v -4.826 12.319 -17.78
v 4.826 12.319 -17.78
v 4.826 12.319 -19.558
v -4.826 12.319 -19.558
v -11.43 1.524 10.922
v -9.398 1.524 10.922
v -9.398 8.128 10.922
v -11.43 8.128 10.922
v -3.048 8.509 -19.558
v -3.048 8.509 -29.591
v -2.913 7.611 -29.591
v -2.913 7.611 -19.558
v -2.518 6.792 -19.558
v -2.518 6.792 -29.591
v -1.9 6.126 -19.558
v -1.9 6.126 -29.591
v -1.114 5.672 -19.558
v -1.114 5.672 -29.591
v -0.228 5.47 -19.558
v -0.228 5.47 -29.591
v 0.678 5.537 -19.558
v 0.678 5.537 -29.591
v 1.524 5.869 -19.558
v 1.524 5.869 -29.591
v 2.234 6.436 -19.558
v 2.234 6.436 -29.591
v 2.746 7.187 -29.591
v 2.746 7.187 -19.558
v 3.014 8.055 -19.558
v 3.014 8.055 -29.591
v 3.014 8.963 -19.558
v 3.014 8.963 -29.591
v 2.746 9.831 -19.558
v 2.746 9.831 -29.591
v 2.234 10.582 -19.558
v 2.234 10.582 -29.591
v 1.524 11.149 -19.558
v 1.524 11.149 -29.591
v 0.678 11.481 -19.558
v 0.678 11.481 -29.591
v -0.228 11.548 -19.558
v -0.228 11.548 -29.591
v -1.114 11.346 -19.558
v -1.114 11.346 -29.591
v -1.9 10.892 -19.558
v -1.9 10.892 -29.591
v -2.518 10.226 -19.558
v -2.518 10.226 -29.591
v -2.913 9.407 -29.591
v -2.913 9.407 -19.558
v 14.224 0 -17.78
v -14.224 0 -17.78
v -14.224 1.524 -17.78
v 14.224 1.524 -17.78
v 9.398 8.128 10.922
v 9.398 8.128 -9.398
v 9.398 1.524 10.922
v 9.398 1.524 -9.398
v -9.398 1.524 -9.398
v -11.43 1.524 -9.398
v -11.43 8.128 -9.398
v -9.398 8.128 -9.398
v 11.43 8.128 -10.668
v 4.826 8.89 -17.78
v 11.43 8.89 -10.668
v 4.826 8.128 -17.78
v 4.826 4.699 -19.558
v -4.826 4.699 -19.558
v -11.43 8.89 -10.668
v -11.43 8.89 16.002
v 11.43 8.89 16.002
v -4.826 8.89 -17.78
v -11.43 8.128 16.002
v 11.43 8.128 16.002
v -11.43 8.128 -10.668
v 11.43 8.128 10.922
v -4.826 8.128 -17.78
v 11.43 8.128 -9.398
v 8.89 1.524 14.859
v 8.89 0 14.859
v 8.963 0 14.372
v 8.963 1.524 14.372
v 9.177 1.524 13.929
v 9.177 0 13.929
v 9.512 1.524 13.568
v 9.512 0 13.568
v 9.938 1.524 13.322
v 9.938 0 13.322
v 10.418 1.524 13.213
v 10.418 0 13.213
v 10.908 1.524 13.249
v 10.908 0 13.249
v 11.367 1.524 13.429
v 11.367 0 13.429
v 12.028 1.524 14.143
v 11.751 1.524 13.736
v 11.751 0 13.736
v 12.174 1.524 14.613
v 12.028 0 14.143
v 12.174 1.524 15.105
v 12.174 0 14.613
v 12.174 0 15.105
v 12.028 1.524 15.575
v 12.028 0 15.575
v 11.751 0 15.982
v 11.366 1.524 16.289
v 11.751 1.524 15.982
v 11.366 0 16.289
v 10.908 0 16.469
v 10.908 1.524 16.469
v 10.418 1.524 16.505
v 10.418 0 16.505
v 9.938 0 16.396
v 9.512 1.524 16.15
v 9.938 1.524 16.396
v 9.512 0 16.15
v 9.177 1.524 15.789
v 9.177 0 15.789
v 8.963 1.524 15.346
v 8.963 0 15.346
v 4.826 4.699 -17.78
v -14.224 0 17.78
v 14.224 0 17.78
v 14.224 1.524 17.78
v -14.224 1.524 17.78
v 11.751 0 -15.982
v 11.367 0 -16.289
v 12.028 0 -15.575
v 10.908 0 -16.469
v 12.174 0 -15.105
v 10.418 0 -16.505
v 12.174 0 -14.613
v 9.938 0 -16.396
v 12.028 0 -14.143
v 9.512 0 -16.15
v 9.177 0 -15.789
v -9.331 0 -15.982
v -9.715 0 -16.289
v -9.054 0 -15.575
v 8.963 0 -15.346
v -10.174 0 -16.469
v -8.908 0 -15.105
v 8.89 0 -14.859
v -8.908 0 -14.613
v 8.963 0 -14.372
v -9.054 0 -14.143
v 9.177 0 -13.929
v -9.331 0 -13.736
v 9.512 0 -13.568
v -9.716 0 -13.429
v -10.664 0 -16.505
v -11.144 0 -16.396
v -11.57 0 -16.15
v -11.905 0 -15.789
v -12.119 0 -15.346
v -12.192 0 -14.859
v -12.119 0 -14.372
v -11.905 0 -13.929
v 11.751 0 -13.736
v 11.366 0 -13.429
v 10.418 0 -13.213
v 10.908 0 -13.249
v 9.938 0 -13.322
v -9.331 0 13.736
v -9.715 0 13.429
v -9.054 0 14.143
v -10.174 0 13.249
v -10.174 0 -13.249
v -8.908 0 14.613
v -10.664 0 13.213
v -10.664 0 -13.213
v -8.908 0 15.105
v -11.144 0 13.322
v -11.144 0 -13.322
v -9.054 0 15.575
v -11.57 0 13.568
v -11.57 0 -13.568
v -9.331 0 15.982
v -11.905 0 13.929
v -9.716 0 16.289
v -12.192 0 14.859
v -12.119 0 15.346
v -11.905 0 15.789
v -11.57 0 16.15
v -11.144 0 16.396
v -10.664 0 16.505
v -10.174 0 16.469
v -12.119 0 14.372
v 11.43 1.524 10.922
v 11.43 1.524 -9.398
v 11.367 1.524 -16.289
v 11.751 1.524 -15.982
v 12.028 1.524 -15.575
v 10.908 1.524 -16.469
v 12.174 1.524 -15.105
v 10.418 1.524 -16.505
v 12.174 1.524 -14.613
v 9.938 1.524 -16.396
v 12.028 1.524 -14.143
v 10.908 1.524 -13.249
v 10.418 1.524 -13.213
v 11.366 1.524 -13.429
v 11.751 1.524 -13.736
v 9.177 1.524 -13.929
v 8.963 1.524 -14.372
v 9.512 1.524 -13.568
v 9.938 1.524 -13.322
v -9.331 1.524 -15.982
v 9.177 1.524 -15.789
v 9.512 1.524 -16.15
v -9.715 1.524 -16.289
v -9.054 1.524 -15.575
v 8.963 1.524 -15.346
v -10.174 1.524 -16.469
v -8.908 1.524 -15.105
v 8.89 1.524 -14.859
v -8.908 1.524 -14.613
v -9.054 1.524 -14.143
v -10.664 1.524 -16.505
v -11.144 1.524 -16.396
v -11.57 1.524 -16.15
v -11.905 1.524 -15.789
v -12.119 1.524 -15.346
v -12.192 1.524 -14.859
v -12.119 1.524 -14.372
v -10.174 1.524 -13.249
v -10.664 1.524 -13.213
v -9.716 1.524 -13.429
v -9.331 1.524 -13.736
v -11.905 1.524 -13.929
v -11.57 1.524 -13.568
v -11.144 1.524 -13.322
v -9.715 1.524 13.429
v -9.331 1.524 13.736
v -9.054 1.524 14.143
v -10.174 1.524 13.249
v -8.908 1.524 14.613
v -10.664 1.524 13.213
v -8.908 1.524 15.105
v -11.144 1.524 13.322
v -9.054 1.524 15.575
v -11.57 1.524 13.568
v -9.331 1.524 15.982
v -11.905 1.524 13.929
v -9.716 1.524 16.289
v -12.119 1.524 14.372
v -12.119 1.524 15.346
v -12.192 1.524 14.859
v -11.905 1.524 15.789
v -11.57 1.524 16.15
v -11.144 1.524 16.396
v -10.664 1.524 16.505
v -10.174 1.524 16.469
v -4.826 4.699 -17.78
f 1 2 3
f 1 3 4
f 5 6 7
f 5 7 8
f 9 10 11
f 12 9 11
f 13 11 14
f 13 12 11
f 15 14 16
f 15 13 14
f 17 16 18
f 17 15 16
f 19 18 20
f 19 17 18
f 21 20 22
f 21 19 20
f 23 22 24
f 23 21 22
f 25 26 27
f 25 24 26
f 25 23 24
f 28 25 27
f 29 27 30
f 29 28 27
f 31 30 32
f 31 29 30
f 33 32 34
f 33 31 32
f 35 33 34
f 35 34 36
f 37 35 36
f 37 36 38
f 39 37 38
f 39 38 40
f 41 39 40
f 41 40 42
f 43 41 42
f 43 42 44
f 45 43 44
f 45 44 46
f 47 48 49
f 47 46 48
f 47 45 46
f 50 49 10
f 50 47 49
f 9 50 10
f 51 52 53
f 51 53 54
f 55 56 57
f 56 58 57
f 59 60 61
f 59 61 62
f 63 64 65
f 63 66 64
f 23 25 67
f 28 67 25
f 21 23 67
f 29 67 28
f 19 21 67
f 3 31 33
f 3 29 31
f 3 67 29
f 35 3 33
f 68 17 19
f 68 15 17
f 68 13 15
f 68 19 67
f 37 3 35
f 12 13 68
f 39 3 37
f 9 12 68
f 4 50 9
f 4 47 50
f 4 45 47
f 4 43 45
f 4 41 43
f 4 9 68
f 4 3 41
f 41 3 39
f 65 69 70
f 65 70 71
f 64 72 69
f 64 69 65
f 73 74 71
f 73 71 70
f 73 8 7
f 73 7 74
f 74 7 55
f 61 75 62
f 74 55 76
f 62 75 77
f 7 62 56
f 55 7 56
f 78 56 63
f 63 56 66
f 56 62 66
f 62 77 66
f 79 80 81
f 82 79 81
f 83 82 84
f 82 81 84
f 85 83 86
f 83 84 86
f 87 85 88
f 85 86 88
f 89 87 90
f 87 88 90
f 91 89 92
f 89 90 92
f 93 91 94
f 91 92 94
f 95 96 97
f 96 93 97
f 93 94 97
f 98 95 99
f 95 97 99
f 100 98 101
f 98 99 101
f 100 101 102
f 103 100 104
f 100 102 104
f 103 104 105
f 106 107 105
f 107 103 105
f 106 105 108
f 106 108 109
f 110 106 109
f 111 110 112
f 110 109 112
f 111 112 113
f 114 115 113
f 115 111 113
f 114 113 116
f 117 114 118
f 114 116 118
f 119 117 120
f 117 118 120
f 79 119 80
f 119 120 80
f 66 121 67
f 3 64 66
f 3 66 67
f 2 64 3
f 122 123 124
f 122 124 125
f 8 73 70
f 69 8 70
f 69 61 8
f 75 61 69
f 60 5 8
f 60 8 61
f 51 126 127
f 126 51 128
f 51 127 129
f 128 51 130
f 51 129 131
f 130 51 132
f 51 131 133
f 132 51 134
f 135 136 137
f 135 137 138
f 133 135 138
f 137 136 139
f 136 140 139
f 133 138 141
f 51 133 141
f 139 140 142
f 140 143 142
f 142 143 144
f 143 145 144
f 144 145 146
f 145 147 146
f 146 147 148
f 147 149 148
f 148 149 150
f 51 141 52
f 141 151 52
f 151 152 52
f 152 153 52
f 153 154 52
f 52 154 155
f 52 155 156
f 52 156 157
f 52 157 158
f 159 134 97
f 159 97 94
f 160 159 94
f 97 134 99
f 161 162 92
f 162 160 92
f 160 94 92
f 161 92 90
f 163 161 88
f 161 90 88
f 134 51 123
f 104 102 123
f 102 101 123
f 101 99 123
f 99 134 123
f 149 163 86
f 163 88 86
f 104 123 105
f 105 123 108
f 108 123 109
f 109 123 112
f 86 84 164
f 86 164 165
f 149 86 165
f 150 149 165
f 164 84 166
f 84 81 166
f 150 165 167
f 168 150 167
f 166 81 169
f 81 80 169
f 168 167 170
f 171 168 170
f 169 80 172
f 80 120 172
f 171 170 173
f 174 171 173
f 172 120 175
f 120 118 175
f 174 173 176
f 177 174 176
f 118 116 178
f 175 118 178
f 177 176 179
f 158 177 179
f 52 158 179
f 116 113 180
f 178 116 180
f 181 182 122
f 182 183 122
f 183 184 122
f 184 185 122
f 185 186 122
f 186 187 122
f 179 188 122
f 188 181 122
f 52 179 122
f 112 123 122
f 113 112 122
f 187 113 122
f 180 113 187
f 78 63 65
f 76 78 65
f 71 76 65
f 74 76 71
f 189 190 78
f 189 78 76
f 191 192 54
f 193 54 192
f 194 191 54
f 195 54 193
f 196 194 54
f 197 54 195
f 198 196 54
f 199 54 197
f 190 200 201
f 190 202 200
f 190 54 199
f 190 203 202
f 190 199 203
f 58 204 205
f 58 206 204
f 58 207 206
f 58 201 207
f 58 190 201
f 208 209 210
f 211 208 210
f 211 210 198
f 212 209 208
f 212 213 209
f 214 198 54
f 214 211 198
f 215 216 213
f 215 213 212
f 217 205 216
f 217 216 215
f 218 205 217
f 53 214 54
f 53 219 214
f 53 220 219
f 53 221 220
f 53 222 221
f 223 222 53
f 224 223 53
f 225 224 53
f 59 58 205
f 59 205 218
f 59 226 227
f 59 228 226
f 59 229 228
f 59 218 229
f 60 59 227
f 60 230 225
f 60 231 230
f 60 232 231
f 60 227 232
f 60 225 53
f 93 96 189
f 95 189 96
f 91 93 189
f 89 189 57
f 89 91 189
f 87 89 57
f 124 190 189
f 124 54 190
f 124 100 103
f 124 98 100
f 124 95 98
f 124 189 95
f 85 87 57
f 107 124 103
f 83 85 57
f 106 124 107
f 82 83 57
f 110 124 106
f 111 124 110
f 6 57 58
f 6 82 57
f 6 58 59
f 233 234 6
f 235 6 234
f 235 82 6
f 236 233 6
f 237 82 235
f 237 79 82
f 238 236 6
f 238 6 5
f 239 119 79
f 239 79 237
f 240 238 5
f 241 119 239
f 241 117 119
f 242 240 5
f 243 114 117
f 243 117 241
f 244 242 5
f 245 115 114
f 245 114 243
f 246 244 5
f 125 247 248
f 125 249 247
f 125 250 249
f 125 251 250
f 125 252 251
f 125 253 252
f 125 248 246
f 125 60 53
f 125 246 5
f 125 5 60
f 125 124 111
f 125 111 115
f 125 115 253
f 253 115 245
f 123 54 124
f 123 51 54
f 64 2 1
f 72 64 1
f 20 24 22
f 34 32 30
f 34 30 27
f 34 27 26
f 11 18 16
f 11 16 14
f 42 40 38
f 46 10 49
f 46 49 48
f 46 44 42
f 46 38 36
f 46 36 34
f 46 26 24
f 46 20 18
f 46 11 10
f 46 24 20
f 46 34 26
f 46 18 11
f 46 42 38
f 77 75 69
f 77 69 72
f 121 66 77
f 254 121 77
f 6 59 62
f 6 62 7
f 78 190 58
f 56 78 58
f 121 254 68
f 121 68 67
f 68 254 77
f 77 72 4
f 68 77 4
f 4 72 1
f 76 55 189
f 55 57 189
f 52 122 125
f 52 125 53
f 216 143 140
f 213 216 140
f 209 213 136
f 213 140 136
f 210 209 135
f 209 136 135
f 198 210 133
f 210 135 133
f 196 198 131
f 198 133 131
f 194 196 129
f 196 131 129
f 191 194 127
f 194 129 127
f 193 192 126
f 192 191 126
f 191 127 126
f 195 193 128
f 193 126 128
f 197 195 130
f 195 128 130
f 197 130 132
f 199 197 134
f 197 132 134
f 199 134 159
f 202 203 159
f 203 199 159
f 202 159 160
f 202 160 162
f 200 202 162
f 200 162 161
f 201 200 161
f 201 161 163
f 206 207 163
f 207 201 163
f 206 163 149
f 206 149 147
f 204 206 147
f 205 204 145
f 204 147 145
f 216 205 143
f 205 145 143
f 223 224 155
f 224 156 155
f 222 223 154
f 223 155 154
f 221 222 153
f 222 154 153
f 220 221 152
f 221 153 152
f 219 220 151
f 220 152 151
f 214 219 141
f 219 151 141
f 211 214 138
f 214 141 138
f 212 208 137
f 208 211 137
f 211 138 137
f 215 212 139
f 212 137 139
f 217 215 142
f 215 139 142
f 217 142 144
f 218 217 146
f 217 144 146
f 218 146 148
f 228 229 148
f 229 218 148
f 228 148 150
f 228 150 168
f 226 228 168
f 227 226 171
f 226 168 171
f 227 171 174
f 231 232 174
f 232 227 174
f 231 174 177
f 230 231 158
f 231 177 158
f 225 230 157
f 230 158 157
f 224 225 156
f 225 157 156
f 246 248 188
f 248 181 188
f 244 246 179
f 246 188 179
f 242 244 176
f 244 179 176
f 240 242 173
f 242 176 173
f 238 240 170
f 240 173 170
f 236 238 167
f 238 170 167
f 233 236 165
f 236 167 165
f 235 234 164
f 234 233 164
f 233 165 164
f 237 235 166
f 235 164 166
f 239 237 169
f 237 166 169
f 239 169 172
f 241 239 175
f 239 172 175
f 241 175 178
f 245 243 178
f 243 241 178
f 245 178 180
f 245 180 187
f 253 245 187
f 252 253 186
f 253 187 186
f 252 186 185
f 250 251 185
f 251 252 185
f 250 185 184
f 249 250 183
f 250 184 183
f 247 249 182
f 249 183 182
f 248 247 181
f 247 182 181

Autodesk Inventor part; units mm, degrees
ref_plane "YZ Plane" through (0, 0, 0) normal (1, 0, 0) x (0, 1, 0)
ref_plane "XZ Plane" through (0, 0, 0) normal (0, 1, 0) x (-1, 0, 0)
ref_plane "XY Plane" through (0, 0, 0) normal (0, 0, 1) x (1, 0, 0)
sketch "Sketch2" plane through (0, 0, 0) normal (0, 1, 0) x (-1, 0, 0)
  line L0 (-14.224, 17.78) -> (14.224, 17.78)
  line L1 (14.224, 17.78) -> (14.224, -17.78)
  line L2 (14.224, -17.78) -> (-14.224, -17.78)
  line L3 (-14.224, -17.78) -> (-14.224, 17.78)
  circle A0 centre (-10.541, 14.859) radius 1.651
  circle A1 centre (-10.541, -14.859) radius 1.651
  line L4 (0, 13.208) -> (0, -8.1739) construction
  circle A2 centre (10.541, 14.859) radius 1.651
  circle A3 centre (10.541, -14.859) radius 1.651
  point P0 (0, 0)
  dimension "d0" = 28.448
  dimension "d1" = 35.56
  dimension "d2" = 14.224
  dimension "d3" = 17.78
  dimension "d4" = 3.302
  dimension "d5" = 1.27
  dimension "d6" = 2.032
  dimension "d7" = 3.302
  dimension "d8" = 1.27
  dimension "d9" = 2.032
extrude "Extrusion1" add sketch "Sketch2" along normal blind 1.524
sketch "Sketch3" plane through (0, 1.524, 0) normal (0, 1, 0) x (1, 0, 0)
  line L0 (-14.224, -17.78) -> (-14.224, 17.78) projected
  line L1 (-14.224, 17.78) -> (14.224, 17.78) projected
  line L2 (-11.43, 9.398) -> (-9.398, 9.398)
  line L3 (-9.398, 9.398) -> (-9.398, -10.922)
  line L4 (-9.398, -10.922) -> (-11.43, -10.922)
  line L5 (-11.43, -10.922) -> (-11.43, 9.398)
  line L6 (0, 9.398) -> (0, -9.2858) construction
  line L7 (11.43, 9.398) -> (9.398, 9.398)
  line L8 (9.398, 9.398) -> (9.398, -10.922)
  line L9 (9.398, -10.922) -> (11.43, -10.922)
  line L10 (11.43, -10.922) -> (11.43, 9.398)
  point P0 (0, 0)
  dimension "d12" = 2.032
  dimension "d13" = 20.32
  dimension "d14" = 2.794
  dimension "d15" = 8.382
extrude "Extrusion2" add sketch "Sketch3" along normal blind 6.604
sketch "Sketch4" plane through (0, 8.128, 0) normal (0, 1, 0) x (1, 0, 0)
  line L0 (-9.398, 9.398) -> (-9.398, -10.922) projected
  line L1 (-11.43, 9.398) -> (-9.398, 9.398) projected
  line L2 (-11.43, -10.922) -> (-11.43, 9.398) projected
  line L3 (-9.398, -10.922) -> (-11.43, -10.922) projected
  line L4 (11.43, 10.668) -> (11.43, -16.002)
  line L5 (11.43, -16.002) -> (-11.43, -16.002)
  line L6 (-11.43, -16.002) -> (-11.43, 10.668)
  line L7 (-11.43, 10.668) -> (-4.826, 17.78)
  line L8 (-4.826, 17.78) -> (4.826, 17.78)
  line L9 (-14.224, -17.78) -> (-14.224, 17.78) projected
  line L10 (4.826, 17.78) -> (11.43, 10.668)
  line L11 (-11.43, 5.9569) -> (-11.43, -5.9458) construction
  line L12 (14.224, 17.78) -> (14.224, -17.78) construction
  point P0 (0, 0)
  dimension "d18" = 2.794
  dimension "d19" = 2.794
  dimension "d20" = 5.08
  dimension "d21" = 9.652
  dimension "d23" = 26.67
  dimension "d24" = 42.879
  dimension "d25" = 137.121
  dimension "d26" = 16.8789
  dimension "d27" = 4.9762
extrude "Extrusion3" add sketch "Sketch4" along normal blind 0.762
sketch "Sketch5" plane through (4.826, 8.128, -17.78) normal (0, 0, -1) x (-1, 0, 0)
  line L0 (9.652, 0.762) -> (0, 0.762) projected
  line L1 (0, 0) -> (0, 0.762) projected
  line L2 (9.652, 0) -> (9.652, 0.762) projected
  line L3 (0, 4.191) -> (9.652, 4.191)
  line L4 (9.652, 4.191) -> (9.652, -3.429)
  line L5 (9.652, -3.429) -> (0, -3.429)
  line L6 (0, -3.429) -> (0, 4.191)
  point P0 (4.826, -8.128)
  point P1 (0, 0.381)
  point P2 (9.652, 0.381)
  dimension "d30" = 7.62
  dimension "d31" = 3.429
extrude "Extrusion4" add sketch "Sketch5" along normal blind 1.778
sketch "Sketch6" plane through (4.826, 8.128, -19.558) normal (0, 0, -1) x (-1, 0, 0)
  circle A0 centre (4.826, 0.381) radius 3.048
  line L0 (0, 4.191) -> (9.652, -3.429) construction
  point P0 (4.826, -8.128)
  point P1 (4.826, 0.381)
  dimension "d34" = 6.096
extrude "Extrusion5" add sketch "Sketch6" along normal blind 10.033
properties part number "XBee"
